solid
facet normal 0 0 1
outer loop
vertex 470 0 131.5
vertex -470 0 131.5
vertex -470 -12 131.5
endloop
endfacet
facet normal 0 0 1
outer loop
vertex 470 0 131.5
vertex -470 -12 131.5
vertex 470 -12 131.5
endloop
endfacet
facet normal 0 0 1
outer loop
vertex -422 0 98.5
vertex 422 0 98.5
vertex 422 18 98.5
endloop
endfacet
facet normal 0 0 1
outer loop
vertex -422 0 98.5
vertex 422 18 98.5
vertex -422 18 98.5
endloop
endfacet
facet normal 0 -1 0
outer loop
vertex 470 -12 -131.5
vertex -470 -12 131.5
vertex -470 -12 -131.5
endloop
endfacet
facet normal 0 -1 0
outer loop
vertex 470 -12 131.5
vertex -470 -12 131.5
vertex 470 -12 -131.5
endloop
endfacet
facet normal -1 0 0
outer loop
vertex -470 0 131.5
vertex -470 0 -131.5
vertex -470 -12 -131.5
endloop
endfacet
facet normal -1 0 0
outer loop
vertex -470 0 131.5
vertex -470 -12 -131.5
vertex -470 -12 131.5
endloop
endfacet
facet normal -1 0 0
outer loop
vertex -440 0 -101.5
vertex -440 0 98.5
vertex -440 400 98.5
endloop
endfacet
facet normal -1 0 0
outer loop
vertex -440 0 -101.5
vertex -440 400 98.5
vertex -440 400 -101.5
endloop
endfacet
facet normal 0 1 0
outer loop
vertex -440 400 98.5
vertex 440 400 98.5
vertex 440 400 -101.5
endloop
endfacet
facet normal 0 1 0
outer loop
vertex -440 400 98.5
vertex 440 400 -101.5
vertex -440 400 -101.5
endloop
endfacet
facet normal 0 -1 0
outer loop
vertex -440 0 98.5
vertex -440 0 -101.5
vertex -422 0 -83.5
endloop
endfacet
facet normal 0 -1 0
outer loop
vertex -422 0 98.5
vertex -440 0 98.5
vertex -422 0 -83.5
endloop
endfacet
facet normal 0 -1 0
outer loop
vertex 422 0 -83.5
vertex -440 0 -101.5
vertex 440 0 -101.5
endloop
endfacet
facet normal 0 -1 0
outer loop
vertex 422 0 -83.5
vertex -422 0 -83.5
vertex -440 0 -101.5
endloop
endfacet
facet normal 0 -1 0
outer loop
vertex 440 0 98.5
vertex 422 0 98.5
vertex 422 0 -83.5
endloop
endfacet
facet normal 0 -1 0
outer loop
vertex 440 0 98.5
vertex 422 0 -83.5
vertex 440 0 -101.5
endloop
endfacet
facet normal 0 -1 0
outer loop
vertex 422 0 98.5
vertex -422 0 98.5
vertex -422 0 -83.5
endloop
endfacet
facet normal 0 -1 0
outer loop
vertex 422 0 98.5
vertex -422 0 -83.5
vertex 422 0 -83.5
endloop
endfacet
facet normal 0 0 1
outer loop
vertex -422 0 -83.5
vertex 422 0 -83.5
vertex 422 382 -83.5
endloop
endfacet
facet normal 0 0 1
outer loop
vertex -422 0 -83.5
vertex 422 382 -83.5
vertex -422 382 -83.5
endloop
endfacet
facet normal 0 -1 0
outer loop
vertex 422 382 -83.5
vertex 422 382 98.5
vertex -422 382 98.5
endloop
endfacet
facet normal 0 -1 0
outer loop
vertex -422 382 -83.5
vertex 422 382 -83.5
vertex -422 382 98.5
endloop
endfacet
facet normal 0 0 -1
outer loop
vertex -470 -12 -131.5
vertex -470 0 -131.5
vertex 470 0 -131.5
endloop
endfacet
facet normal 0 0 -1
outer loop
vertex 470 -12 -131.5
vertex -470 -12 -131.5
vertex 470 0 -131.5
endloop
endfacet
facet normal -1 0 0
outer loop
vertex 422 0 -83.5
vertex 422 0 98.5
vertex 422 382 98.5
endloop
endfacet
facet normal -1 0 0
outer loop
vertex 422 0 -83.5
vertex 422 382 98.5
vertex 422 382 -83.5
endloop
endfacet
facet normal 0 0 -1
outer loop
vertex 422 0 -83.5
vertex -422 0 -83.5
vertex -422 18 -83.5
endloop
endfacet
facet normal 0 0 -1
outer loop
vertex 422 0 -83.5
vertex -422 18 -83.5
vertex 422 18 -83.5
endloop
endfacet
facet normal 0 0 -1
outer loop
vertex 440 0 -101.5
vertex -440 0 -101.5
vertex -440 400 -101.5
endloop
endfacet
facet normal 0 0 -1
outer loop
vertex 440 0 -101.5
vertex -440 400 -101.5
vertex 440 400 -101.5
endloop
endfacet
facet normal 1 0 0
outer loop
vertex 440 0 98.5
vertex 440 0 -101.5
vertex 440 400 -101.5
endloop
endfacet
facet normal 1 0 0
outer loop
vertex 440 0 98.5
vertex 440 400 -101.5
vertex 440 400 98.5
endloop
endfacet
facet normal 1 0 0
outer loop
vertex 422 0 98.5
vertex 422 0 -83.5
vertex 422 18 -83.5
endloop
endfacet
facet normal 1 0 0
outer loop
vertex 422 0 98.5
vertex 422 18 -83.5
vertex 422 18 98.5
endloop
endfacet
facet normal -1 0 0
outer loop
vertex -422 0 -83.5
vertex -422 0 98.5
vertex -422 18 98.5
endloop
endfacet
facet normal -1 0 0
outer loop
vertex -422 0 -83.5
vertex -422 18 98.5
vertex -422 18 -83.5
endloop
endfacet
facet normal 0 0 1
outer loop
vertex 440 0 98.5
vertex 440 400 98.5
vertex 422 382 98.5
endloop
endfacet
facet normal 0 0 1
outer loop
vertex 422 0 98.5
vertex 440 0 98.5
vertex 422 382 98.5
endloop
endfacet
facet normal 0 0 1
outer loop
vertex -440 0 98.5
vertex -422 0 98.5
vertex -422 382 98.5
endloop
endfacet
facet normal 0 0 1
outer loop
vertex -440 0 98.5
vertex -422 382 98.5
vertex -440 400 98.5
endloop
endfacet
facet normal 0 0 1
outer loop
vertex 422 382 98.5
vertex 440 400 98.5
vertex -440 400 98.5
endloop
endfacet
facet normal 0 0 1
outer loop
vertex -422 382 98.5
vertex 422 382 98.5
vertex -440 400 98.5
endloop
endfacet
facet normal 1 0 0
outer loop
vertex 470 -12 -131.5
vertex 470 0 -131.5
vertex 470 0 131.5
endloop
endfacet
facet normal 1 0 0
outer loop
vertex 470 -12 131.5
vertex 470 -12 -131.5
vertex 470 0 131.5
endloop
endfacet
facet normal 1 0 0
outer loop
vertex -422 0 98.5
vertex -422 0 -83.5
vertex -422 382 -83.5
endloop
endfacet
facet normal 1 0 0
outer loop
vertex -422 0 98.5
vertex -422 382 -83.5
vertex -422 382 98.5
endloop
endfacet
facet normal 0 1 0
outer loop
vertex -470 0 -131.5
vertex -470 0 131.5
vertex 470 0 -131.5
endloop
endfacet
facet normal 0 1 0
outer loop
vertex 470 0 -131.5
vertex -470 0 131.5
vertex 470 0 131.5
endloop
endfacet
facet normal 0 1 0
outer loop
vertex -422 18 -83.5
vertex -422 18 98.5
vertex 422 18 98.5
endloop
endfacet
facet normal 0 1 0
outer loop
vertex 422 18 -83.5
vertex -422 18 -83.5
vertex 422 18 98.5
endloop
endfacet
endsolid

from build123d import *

# Parameters (mm, degrees)
F0_W     = 18
F0_H     = 182
F1_DEPTH = 400
F0_W_2   = 940
F0_H_2   = 263
F2_DEPTH = 12
F3_DEPTH = 18
F4_W     = 844
F4_H     = 182
F5_DEPTH = 18


with BuildPart() as f1:
    # F0 (on Front) → F1 (new body)
    with BuildSketch(Plane.XZ):
        with Locations((-431, 7.5)):
            Rectangle(F0_W, F0_H)
        Polygon((-440, -101.5), (440, -101.5), (440, 98.5), (422, 98.5), (422, -83.5), (404, -83.5), (-422, -83.5), (-440, -83.5), align=None)
    extrude(amount=-F1_DEPTH)

    # F4 (on face) → F5 (join)
    with BuildSketch(Plane(origin=(0, 400, 0), x_dir=(-1, 0, 0), z_dir=(0, 1, 0))):
        with Locations((0, 7.5)):
            Rectangle(F4_W, F4_H)
    extrude(amount=-F5_DEPTH)


with BuildPart() as f2:
    # F0 (on Front) → F2 (new body)
    with BuildSketch(Plane.XZ):
        Rectangle(F0_W_2, F0_H_2)
        Polygon((440, 98.5), (440, -101.5), (-440, -101.5), (-440, -83.5), (-440, 98.5), (-422, 98.5), (422, 98.5), align=None, mode=Mode.SUBTRACT)
        Polygon((422, -83.5), (422, 98.5), (-422, 98.5), (-422, -83.5), (404, -83.5), align=None)
        Polygon((-440, -101.5), (440, -101.5), (440, 98.5), (422, 98.5), (422, -83.5), (404, -83.5), (-422, -83.5), (-440, -83.5), align=None)
        with Locations((-431, 7.5)):
            Rectangle(F0_W, F0_H)
    extrude(amount=F2_DEPTH)


with BuildPart() as f3:
    # F0 (on Front) → F3 (new body)
    with BuildSketch(Plane.XZ):
        Polygon((422, -83.5), (422, 98.5), (-422, 98.5), (-422, -83.5), (404, -83.5), align=None)
    extrude(amount=-F3_DEPTH)


solid = Compound([f1.part, f2.part, f3.part])
